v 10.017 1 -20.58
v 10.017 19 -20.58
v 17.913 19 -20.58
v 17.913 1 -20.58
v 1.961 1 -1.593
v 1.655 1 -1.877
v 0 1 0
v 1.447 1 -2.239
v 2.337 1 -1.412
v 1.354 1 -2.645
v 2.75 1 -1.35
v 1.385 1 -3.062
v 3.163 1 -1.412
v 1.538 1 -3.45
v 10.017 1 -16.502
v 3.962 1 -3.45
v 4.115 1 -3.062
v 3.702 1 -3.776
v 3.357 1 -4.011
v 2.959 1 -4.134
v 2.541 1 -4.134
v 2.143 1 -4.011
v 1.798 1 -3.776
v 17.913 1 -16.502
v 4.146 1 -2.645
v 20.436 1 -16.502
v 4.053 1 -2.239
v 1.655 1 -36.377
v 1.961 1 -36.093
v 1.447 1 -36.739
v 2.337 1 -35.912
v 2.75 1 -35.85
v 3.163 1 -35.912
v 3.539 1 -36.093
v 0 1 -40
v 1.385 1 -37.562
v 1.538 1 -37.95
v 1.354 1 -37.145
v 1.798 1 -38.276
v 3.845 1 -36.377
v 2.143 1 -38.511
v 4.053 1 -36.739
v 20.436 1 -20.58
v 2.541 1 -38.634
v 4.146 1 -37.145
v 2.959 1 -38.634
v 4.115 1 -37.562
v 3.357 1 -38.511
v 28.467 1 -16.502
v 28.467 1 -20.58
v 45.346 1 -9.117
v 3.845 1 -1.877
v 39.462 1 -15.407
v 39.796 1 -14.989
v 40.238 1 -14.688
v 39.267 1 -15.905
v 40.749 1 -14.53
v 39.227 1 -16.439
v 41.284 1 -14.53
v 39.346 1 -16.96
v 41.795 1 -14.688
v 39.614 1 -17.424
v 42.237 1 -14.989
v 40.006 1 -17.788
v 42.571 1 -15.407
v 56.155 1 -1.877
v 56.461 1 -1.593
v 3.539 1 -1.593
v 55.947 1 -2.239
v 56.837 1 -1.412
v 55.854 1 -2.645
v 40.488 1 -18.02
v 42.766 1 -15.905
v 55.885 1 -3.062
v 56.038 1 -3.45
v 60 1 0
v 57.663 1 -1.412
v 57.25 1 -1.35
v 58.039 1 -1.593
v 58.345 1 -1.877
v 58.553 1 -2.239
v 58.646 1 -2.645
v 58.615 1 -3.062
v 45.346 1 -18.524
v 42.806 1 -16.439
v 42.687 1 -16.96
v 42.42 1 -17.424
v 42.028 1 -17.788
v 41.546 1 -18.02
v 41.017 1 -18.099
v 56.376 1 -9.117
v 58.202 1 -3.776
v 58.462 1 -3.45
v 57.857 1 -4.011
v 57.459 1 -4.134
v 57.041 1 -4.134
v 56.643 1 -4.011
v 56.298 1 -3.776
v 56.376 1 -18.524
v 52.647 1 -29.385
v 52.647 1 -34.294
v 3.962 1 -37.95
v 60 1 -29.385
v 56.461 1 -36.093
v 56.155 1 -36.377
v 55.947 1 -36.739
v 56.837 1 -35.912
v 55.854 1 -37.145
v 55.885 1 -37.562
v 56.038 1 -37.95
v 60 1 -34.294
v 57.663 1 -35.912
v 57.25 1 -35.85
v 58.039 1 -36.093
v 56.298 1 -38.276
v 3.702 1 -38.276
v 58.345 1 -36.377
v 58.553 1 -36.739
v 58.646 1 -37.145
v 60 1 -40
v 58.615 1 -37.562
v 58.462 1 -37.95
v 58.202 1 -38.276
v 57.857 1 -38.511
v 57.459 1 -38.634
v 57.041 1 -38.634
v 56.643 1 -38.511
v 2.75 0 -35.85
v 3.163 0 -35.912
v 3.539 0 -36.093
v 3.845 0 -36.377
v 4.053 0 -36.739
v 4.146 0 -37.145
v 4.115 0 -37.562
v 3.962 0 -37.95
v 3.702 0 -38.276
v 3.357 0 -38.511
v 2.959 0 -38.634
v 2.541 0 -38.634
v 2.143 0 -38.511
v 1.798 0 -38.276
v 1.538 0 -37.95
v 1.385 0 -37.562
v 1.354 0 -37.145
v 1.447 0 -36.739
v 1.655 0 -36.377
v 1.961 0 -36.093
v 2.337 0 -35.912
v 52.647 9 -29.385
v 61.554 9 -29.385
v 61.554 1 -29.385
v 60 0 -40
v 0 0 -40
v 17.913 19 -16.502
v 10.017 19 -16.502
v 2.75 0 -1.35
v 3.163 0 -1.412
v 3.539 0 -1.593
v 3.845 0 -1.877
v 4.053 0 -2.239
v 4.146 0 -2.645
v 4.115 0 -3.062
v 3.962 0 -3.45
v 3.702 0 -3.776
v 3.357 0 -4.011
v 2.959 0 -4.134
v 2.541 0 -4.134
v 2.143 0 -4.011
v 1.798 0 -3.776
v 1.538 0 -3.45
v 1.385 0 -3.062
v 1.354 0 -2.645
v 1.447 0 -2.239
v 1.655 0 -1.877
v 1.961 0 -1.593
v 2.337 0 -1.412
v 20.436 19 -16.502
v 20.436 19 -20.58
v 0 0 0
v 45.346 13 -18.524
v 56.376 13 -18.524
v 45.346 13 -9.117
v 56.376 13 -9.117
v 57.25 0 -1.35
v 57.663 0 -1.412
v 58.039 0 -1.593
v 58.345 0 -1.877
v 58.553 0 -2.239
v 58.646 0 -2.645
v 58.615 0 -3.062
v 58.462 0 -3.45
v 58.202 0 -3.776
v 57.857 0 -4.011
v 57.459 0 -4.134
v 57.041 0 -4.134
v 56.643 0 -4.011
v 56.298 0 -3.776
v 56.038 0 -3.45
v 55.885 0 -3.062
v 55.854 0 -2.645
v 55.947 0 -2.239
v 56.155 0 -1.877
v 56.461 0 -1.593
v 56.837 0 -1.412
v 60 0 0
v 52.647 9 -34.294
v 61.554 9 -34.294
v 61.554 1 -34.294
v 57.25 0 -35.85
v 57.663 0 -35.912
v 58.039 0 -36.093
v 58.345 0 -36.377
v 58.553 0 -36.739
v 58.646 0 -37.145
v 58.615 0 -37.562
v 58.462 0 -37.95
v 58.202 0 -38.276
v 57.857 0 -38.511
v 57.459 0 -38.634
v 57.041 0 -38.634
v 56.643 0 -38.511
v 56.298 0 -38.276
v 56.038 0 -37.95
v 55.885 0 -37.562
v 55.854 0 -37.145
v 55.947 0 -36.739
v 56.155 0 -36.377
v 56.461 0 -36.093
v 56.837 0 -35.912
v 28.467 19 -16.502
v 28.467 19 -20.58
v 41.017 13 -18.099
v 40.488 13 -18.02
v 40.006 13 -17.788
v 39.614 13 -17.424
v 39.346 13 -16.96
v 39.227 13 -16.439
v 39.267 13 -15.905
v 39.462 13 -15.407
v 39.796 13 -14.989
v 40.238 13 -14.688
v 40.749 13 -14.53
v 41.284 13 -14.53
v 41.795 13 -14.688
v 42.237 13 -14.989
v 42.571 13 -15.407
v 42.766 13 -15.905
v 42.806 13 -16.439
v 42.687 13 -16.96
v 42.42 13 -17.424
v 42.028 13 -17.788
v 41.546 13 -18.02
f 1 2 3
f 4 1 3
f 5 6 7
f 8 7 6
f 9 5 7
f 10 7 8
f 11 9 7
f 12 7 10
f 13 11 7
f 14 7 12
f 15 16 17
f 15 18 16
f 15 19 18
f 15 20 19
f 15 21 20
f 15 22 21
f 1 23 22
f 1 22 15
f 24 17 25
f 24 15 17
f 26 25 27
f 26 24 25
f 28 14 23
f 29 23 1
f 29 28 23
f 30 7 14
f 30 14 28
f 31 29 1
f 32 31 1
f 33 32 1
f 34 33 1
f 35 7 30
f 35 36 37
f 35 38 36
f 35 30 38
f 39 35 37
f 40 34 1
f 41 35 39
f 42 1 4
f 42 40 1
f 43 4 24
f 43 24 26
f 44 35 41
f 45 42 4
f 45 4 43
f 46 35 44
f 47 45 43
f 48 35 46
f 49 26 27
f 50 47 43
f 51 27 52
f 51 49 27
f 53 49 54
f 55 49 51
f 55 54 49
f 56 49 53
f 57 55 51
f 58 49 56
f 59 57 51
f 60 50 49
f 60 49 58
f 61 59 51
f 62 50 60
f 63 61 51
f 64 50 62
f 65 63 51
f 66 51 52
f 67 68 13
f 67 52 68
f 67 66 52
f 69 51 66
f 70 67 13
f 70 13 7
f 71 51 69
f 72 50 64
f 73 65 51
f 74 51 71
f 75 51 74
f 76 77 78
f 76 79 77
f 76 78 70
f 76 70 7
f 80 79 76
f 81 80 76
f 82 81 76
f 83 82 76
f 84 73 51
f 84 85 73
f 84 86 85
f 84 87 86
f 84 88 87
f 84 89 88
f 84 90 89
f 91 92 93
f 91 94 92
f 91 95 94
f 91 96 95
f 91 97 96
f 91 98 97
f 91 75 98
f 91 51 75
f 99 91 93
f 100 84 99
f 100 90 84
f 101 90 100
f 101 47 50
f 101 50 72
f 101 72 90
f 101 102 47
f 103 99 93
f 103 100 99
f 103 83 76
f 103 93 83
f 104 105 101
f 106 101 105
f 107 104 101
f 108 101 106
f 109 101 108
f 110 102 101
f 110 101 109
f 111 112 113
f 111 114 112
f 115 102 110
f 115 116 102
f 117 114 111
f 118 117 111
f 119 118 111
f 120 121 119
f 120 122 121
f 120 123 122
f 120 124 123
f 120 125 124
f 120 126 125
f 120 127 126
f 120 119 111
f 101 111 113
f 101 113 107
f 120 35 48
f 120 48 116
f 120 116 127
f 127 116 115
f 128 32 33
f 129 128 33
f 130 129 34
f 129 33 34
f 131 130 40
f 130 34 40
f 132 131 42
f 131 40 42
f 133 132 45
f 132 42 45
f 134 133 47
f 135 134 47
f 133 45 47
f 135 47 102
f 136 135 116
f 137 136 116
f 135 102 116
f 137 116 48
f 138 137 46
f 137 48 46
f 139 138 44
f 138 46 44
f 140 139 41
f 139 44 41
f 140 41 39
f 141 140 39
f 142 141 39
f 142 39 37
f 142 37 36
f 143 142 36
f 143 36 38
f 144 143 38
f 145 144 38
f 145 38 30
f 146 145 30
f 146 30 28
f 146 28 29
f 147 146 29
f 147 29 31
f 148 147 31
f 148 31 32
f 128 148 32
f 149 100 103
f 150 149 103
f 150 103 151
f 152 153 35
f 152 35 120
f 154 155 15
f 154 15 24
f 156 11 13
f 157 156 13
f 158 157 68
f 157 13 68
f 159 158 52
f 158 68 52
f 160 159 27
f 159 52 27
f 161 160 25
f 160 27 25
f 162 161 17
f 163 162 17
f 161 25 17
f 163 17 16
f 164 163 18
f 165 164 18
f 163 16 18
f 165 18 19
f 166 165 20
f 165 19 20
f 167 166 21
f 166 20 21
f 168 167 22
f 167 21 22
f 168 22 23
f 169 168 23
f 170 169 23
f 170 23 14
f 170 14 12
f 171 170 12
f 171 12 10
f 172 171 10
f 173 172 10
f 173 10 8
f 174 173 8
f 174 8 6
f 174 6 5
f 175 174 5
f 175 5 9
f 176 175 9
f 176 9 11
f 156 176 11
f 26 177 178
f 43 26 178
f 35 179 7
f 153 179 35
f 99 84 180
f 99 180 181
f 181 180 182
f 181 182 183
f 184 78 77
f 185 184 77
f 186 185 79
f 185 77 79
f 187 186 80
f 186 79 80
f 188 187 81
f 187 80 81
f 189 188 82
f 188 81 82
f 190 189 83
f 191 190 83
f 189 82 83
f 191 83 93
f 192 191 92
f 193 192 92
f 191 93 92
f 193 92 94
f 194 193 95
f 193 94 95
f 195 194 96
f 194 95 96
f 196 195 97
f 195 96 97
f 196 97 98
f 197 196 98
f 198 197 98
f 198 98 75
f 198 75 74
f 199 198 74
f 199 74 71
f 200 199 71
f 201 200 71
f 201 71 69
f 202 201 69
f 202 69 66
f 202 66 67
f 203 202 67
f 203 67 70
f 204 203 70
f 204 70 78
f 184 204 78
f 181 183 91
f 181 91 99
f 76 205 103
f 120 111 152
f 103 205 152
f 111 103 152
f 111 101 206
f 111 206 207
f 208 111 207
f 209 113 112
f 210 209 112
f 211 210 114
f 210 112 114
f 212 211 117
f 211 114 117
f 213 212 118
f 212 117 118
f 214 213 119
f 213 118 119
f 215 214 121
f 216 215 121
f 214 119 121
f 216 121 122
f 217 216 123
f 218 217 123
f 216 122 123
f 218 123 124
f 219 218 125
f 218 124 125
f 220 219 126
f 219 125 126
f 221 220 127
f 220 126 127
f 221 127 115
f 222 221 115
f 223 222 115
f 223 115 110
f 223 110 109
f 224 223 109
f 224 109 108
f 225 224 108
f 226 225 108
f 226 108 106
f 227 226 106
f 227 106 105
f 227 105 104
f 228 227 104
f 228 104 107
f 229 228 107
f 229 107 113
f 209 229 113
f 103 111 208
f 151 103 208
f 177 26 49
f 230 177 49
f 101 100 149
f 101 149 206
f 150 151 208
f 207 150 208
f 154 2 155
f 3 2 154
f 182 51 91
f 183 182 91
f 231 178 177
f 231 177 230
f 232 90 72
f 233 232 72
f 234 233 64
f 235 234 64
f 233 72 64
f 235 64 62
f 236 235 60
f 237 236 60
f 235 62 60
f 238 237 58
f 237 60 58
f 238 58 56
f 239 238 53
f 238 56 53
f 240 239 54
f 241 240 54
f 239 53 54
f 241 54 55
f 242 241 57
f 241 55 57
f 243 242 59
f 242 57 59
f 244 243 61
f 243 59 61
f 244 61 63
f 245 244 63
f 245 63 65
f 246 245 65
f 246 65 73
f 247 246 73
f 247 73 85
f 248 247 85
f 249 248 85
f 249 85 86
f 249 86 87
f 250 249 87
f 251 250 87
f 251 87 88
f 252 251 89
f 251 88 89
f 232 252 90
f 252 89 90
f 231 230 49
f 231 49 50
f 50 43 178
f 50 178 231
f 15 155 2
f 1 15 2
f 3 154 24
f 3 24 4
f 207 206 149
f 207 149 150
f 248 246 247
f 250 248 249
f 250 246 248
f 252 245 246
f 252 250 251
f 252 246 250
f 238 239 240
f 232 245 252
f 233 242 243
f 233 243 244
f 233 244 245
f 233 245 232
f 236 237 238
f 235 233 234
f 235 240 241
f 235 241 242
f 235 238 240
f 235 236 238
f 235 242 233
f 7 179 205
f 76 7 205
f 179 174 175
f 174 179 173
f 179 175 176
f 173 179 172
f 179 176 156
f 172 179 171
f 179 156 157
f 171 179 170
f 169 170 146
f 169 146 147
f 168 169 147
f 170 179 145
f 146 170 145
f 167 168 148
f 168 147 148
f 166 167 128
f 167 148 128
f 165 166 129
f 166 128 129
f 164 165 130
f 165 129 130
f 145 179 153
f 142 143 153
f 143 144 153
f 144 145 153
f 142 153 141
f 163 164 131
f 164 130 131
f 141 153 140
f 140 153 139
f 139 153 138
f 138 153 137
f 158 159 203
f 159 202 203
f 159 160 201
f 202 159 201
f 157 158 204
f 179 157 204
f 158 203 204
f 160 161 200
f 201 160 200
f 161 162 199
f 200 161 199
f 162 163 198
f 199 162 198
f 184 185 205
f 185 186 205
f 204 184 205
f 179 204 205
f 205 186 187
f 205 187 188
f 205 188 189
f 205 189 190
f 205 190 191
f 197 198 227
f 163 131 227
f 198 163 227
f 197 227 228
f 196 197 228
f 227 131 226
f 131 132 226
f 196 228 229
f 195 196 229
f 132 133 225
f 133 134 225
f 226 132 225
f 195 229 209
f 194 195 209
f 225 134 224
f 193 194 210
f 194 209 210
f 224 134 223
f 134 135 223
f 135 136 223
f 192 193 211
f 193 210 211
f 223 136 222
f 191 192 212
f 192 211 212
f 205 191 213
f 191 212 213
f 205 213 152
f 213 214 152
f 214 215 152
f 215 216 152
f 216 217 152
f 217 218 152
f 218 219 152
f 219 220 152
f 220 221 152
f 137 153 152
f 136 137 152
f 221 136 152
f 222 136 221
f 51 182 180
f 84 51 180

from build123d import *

# Parameters (mm, degrees)
SKETCH1_W           = 60
SKETCH1_H           = 40
BOSS_EXTRUDE1_DEPTH = 1
SKETCH2_R           = 1.4
CUT_EXTRUDE1_DEPTH  = 73.117958928
SKETCH3_R           = 1.794713796
SKETCH3_W           = 11.029321298
SKETCH3_H           = 9.406259618
BOSS_EXTRUDE2_DEPTH = 12
SKETCH4_W           = 8.907146541
SKETCH4_H           = 4.90887134
BOSS_EXTRUDE3_DEPTH = 8
SKETCH5_W           = 7.89622208
SKETCH5_H           = 4.078620146
SKETCH5_W_2         = 8.030698063
BOSS_EXTRUDE4_DEPTH = 18


with BuildPart() as part:
    # Sketch1 → Boss-Extrude1 (new body)
    with BuildSketch(Plane(origin=(0, 0, 0), x_dir=(1, 0, 0), z_dir=(0, 1, 0))):
        with Locations((30, 20)):
            Rectangle(SKETCH1_W, SKETCH1_H)
    extrude(amount=BOSS_EXTRUDE1_DEPTH)

    # Sketch2 → Cut-Extrude1 (cut, through all)
    with BuildSketch(Plane(origin=(0, 1, 0), x_dir=(1, 0, 0), z_dir=(0, 1, 0))):
        with Locations(Location((2.75, 37.25, 0), (0, 0, 270))):
            Circle(SKETCH2_R)
        with Locations(Location((57.25, 37.25, 0), (0, 0, 270))):
            Circle(SKETCH2_R)
        with Locations(Location((57.25, 2.75, 0), (0, 0, 270))):
            Circle(SKETCH2_R)
        with Locations(Location((2.75, 2.75, 0), (0, 0, 270))):
            Circle(SKETCH2_R)
    extrude(amount=-CUT_EXTRUDE1_DEPTH, mode=Mode.SUBTRACT)

    # Sketch3 → Boss-Extrude2 (add)
    with BuildSketch(Plane(origin=(0, 1, 0), x_dir=(1, 0, 0), z_dir=(0, 1, 0))):
        with Locations(Location((41.01670641, 16.304679201, 0), (0, 0, 90))):
            Circle(SKETCH3_R)
        with Locations((50.861034001, 13.82058061)):
            Rectangle(SKETCH3_W, SKETCH3_H)
    extrude(amount=BOSS_EXTRUDE2_DEPTH)

    # Sketch4 → Boss-Extrude3 (add)
    with BuildSketch(Plane(origin=(0, 1, 0), x_dir=(1, 0, 0), z_dir=(0, 1, 0))):
        with Locations((57.100404147, 31.839794384)):
            Rectangle(SKETCH4_W, SKETCH4_H)
    extrude(amount=BOSS_EXTRUDE3_DEPTH)

    # Sketch5 → Boss-Extrude4 (add)
    with BuildSketch(Plane(origin=(0, 1, 0), x_dir=(1, 0, 0), z_dir=(0, 1, 0))):
        with Locations((13.964882377, 18.540826958)):
            Rectangle(SKETCH5_W, SKETCH5_H)
        with Locations((24.451181127, 18.540826958)):
            Rectangle(SKETCH5_W_2, SKETCH5_H)
    extrude(amount=BOSS_EXTRUDE4_DEPTH)


solid = part.part
